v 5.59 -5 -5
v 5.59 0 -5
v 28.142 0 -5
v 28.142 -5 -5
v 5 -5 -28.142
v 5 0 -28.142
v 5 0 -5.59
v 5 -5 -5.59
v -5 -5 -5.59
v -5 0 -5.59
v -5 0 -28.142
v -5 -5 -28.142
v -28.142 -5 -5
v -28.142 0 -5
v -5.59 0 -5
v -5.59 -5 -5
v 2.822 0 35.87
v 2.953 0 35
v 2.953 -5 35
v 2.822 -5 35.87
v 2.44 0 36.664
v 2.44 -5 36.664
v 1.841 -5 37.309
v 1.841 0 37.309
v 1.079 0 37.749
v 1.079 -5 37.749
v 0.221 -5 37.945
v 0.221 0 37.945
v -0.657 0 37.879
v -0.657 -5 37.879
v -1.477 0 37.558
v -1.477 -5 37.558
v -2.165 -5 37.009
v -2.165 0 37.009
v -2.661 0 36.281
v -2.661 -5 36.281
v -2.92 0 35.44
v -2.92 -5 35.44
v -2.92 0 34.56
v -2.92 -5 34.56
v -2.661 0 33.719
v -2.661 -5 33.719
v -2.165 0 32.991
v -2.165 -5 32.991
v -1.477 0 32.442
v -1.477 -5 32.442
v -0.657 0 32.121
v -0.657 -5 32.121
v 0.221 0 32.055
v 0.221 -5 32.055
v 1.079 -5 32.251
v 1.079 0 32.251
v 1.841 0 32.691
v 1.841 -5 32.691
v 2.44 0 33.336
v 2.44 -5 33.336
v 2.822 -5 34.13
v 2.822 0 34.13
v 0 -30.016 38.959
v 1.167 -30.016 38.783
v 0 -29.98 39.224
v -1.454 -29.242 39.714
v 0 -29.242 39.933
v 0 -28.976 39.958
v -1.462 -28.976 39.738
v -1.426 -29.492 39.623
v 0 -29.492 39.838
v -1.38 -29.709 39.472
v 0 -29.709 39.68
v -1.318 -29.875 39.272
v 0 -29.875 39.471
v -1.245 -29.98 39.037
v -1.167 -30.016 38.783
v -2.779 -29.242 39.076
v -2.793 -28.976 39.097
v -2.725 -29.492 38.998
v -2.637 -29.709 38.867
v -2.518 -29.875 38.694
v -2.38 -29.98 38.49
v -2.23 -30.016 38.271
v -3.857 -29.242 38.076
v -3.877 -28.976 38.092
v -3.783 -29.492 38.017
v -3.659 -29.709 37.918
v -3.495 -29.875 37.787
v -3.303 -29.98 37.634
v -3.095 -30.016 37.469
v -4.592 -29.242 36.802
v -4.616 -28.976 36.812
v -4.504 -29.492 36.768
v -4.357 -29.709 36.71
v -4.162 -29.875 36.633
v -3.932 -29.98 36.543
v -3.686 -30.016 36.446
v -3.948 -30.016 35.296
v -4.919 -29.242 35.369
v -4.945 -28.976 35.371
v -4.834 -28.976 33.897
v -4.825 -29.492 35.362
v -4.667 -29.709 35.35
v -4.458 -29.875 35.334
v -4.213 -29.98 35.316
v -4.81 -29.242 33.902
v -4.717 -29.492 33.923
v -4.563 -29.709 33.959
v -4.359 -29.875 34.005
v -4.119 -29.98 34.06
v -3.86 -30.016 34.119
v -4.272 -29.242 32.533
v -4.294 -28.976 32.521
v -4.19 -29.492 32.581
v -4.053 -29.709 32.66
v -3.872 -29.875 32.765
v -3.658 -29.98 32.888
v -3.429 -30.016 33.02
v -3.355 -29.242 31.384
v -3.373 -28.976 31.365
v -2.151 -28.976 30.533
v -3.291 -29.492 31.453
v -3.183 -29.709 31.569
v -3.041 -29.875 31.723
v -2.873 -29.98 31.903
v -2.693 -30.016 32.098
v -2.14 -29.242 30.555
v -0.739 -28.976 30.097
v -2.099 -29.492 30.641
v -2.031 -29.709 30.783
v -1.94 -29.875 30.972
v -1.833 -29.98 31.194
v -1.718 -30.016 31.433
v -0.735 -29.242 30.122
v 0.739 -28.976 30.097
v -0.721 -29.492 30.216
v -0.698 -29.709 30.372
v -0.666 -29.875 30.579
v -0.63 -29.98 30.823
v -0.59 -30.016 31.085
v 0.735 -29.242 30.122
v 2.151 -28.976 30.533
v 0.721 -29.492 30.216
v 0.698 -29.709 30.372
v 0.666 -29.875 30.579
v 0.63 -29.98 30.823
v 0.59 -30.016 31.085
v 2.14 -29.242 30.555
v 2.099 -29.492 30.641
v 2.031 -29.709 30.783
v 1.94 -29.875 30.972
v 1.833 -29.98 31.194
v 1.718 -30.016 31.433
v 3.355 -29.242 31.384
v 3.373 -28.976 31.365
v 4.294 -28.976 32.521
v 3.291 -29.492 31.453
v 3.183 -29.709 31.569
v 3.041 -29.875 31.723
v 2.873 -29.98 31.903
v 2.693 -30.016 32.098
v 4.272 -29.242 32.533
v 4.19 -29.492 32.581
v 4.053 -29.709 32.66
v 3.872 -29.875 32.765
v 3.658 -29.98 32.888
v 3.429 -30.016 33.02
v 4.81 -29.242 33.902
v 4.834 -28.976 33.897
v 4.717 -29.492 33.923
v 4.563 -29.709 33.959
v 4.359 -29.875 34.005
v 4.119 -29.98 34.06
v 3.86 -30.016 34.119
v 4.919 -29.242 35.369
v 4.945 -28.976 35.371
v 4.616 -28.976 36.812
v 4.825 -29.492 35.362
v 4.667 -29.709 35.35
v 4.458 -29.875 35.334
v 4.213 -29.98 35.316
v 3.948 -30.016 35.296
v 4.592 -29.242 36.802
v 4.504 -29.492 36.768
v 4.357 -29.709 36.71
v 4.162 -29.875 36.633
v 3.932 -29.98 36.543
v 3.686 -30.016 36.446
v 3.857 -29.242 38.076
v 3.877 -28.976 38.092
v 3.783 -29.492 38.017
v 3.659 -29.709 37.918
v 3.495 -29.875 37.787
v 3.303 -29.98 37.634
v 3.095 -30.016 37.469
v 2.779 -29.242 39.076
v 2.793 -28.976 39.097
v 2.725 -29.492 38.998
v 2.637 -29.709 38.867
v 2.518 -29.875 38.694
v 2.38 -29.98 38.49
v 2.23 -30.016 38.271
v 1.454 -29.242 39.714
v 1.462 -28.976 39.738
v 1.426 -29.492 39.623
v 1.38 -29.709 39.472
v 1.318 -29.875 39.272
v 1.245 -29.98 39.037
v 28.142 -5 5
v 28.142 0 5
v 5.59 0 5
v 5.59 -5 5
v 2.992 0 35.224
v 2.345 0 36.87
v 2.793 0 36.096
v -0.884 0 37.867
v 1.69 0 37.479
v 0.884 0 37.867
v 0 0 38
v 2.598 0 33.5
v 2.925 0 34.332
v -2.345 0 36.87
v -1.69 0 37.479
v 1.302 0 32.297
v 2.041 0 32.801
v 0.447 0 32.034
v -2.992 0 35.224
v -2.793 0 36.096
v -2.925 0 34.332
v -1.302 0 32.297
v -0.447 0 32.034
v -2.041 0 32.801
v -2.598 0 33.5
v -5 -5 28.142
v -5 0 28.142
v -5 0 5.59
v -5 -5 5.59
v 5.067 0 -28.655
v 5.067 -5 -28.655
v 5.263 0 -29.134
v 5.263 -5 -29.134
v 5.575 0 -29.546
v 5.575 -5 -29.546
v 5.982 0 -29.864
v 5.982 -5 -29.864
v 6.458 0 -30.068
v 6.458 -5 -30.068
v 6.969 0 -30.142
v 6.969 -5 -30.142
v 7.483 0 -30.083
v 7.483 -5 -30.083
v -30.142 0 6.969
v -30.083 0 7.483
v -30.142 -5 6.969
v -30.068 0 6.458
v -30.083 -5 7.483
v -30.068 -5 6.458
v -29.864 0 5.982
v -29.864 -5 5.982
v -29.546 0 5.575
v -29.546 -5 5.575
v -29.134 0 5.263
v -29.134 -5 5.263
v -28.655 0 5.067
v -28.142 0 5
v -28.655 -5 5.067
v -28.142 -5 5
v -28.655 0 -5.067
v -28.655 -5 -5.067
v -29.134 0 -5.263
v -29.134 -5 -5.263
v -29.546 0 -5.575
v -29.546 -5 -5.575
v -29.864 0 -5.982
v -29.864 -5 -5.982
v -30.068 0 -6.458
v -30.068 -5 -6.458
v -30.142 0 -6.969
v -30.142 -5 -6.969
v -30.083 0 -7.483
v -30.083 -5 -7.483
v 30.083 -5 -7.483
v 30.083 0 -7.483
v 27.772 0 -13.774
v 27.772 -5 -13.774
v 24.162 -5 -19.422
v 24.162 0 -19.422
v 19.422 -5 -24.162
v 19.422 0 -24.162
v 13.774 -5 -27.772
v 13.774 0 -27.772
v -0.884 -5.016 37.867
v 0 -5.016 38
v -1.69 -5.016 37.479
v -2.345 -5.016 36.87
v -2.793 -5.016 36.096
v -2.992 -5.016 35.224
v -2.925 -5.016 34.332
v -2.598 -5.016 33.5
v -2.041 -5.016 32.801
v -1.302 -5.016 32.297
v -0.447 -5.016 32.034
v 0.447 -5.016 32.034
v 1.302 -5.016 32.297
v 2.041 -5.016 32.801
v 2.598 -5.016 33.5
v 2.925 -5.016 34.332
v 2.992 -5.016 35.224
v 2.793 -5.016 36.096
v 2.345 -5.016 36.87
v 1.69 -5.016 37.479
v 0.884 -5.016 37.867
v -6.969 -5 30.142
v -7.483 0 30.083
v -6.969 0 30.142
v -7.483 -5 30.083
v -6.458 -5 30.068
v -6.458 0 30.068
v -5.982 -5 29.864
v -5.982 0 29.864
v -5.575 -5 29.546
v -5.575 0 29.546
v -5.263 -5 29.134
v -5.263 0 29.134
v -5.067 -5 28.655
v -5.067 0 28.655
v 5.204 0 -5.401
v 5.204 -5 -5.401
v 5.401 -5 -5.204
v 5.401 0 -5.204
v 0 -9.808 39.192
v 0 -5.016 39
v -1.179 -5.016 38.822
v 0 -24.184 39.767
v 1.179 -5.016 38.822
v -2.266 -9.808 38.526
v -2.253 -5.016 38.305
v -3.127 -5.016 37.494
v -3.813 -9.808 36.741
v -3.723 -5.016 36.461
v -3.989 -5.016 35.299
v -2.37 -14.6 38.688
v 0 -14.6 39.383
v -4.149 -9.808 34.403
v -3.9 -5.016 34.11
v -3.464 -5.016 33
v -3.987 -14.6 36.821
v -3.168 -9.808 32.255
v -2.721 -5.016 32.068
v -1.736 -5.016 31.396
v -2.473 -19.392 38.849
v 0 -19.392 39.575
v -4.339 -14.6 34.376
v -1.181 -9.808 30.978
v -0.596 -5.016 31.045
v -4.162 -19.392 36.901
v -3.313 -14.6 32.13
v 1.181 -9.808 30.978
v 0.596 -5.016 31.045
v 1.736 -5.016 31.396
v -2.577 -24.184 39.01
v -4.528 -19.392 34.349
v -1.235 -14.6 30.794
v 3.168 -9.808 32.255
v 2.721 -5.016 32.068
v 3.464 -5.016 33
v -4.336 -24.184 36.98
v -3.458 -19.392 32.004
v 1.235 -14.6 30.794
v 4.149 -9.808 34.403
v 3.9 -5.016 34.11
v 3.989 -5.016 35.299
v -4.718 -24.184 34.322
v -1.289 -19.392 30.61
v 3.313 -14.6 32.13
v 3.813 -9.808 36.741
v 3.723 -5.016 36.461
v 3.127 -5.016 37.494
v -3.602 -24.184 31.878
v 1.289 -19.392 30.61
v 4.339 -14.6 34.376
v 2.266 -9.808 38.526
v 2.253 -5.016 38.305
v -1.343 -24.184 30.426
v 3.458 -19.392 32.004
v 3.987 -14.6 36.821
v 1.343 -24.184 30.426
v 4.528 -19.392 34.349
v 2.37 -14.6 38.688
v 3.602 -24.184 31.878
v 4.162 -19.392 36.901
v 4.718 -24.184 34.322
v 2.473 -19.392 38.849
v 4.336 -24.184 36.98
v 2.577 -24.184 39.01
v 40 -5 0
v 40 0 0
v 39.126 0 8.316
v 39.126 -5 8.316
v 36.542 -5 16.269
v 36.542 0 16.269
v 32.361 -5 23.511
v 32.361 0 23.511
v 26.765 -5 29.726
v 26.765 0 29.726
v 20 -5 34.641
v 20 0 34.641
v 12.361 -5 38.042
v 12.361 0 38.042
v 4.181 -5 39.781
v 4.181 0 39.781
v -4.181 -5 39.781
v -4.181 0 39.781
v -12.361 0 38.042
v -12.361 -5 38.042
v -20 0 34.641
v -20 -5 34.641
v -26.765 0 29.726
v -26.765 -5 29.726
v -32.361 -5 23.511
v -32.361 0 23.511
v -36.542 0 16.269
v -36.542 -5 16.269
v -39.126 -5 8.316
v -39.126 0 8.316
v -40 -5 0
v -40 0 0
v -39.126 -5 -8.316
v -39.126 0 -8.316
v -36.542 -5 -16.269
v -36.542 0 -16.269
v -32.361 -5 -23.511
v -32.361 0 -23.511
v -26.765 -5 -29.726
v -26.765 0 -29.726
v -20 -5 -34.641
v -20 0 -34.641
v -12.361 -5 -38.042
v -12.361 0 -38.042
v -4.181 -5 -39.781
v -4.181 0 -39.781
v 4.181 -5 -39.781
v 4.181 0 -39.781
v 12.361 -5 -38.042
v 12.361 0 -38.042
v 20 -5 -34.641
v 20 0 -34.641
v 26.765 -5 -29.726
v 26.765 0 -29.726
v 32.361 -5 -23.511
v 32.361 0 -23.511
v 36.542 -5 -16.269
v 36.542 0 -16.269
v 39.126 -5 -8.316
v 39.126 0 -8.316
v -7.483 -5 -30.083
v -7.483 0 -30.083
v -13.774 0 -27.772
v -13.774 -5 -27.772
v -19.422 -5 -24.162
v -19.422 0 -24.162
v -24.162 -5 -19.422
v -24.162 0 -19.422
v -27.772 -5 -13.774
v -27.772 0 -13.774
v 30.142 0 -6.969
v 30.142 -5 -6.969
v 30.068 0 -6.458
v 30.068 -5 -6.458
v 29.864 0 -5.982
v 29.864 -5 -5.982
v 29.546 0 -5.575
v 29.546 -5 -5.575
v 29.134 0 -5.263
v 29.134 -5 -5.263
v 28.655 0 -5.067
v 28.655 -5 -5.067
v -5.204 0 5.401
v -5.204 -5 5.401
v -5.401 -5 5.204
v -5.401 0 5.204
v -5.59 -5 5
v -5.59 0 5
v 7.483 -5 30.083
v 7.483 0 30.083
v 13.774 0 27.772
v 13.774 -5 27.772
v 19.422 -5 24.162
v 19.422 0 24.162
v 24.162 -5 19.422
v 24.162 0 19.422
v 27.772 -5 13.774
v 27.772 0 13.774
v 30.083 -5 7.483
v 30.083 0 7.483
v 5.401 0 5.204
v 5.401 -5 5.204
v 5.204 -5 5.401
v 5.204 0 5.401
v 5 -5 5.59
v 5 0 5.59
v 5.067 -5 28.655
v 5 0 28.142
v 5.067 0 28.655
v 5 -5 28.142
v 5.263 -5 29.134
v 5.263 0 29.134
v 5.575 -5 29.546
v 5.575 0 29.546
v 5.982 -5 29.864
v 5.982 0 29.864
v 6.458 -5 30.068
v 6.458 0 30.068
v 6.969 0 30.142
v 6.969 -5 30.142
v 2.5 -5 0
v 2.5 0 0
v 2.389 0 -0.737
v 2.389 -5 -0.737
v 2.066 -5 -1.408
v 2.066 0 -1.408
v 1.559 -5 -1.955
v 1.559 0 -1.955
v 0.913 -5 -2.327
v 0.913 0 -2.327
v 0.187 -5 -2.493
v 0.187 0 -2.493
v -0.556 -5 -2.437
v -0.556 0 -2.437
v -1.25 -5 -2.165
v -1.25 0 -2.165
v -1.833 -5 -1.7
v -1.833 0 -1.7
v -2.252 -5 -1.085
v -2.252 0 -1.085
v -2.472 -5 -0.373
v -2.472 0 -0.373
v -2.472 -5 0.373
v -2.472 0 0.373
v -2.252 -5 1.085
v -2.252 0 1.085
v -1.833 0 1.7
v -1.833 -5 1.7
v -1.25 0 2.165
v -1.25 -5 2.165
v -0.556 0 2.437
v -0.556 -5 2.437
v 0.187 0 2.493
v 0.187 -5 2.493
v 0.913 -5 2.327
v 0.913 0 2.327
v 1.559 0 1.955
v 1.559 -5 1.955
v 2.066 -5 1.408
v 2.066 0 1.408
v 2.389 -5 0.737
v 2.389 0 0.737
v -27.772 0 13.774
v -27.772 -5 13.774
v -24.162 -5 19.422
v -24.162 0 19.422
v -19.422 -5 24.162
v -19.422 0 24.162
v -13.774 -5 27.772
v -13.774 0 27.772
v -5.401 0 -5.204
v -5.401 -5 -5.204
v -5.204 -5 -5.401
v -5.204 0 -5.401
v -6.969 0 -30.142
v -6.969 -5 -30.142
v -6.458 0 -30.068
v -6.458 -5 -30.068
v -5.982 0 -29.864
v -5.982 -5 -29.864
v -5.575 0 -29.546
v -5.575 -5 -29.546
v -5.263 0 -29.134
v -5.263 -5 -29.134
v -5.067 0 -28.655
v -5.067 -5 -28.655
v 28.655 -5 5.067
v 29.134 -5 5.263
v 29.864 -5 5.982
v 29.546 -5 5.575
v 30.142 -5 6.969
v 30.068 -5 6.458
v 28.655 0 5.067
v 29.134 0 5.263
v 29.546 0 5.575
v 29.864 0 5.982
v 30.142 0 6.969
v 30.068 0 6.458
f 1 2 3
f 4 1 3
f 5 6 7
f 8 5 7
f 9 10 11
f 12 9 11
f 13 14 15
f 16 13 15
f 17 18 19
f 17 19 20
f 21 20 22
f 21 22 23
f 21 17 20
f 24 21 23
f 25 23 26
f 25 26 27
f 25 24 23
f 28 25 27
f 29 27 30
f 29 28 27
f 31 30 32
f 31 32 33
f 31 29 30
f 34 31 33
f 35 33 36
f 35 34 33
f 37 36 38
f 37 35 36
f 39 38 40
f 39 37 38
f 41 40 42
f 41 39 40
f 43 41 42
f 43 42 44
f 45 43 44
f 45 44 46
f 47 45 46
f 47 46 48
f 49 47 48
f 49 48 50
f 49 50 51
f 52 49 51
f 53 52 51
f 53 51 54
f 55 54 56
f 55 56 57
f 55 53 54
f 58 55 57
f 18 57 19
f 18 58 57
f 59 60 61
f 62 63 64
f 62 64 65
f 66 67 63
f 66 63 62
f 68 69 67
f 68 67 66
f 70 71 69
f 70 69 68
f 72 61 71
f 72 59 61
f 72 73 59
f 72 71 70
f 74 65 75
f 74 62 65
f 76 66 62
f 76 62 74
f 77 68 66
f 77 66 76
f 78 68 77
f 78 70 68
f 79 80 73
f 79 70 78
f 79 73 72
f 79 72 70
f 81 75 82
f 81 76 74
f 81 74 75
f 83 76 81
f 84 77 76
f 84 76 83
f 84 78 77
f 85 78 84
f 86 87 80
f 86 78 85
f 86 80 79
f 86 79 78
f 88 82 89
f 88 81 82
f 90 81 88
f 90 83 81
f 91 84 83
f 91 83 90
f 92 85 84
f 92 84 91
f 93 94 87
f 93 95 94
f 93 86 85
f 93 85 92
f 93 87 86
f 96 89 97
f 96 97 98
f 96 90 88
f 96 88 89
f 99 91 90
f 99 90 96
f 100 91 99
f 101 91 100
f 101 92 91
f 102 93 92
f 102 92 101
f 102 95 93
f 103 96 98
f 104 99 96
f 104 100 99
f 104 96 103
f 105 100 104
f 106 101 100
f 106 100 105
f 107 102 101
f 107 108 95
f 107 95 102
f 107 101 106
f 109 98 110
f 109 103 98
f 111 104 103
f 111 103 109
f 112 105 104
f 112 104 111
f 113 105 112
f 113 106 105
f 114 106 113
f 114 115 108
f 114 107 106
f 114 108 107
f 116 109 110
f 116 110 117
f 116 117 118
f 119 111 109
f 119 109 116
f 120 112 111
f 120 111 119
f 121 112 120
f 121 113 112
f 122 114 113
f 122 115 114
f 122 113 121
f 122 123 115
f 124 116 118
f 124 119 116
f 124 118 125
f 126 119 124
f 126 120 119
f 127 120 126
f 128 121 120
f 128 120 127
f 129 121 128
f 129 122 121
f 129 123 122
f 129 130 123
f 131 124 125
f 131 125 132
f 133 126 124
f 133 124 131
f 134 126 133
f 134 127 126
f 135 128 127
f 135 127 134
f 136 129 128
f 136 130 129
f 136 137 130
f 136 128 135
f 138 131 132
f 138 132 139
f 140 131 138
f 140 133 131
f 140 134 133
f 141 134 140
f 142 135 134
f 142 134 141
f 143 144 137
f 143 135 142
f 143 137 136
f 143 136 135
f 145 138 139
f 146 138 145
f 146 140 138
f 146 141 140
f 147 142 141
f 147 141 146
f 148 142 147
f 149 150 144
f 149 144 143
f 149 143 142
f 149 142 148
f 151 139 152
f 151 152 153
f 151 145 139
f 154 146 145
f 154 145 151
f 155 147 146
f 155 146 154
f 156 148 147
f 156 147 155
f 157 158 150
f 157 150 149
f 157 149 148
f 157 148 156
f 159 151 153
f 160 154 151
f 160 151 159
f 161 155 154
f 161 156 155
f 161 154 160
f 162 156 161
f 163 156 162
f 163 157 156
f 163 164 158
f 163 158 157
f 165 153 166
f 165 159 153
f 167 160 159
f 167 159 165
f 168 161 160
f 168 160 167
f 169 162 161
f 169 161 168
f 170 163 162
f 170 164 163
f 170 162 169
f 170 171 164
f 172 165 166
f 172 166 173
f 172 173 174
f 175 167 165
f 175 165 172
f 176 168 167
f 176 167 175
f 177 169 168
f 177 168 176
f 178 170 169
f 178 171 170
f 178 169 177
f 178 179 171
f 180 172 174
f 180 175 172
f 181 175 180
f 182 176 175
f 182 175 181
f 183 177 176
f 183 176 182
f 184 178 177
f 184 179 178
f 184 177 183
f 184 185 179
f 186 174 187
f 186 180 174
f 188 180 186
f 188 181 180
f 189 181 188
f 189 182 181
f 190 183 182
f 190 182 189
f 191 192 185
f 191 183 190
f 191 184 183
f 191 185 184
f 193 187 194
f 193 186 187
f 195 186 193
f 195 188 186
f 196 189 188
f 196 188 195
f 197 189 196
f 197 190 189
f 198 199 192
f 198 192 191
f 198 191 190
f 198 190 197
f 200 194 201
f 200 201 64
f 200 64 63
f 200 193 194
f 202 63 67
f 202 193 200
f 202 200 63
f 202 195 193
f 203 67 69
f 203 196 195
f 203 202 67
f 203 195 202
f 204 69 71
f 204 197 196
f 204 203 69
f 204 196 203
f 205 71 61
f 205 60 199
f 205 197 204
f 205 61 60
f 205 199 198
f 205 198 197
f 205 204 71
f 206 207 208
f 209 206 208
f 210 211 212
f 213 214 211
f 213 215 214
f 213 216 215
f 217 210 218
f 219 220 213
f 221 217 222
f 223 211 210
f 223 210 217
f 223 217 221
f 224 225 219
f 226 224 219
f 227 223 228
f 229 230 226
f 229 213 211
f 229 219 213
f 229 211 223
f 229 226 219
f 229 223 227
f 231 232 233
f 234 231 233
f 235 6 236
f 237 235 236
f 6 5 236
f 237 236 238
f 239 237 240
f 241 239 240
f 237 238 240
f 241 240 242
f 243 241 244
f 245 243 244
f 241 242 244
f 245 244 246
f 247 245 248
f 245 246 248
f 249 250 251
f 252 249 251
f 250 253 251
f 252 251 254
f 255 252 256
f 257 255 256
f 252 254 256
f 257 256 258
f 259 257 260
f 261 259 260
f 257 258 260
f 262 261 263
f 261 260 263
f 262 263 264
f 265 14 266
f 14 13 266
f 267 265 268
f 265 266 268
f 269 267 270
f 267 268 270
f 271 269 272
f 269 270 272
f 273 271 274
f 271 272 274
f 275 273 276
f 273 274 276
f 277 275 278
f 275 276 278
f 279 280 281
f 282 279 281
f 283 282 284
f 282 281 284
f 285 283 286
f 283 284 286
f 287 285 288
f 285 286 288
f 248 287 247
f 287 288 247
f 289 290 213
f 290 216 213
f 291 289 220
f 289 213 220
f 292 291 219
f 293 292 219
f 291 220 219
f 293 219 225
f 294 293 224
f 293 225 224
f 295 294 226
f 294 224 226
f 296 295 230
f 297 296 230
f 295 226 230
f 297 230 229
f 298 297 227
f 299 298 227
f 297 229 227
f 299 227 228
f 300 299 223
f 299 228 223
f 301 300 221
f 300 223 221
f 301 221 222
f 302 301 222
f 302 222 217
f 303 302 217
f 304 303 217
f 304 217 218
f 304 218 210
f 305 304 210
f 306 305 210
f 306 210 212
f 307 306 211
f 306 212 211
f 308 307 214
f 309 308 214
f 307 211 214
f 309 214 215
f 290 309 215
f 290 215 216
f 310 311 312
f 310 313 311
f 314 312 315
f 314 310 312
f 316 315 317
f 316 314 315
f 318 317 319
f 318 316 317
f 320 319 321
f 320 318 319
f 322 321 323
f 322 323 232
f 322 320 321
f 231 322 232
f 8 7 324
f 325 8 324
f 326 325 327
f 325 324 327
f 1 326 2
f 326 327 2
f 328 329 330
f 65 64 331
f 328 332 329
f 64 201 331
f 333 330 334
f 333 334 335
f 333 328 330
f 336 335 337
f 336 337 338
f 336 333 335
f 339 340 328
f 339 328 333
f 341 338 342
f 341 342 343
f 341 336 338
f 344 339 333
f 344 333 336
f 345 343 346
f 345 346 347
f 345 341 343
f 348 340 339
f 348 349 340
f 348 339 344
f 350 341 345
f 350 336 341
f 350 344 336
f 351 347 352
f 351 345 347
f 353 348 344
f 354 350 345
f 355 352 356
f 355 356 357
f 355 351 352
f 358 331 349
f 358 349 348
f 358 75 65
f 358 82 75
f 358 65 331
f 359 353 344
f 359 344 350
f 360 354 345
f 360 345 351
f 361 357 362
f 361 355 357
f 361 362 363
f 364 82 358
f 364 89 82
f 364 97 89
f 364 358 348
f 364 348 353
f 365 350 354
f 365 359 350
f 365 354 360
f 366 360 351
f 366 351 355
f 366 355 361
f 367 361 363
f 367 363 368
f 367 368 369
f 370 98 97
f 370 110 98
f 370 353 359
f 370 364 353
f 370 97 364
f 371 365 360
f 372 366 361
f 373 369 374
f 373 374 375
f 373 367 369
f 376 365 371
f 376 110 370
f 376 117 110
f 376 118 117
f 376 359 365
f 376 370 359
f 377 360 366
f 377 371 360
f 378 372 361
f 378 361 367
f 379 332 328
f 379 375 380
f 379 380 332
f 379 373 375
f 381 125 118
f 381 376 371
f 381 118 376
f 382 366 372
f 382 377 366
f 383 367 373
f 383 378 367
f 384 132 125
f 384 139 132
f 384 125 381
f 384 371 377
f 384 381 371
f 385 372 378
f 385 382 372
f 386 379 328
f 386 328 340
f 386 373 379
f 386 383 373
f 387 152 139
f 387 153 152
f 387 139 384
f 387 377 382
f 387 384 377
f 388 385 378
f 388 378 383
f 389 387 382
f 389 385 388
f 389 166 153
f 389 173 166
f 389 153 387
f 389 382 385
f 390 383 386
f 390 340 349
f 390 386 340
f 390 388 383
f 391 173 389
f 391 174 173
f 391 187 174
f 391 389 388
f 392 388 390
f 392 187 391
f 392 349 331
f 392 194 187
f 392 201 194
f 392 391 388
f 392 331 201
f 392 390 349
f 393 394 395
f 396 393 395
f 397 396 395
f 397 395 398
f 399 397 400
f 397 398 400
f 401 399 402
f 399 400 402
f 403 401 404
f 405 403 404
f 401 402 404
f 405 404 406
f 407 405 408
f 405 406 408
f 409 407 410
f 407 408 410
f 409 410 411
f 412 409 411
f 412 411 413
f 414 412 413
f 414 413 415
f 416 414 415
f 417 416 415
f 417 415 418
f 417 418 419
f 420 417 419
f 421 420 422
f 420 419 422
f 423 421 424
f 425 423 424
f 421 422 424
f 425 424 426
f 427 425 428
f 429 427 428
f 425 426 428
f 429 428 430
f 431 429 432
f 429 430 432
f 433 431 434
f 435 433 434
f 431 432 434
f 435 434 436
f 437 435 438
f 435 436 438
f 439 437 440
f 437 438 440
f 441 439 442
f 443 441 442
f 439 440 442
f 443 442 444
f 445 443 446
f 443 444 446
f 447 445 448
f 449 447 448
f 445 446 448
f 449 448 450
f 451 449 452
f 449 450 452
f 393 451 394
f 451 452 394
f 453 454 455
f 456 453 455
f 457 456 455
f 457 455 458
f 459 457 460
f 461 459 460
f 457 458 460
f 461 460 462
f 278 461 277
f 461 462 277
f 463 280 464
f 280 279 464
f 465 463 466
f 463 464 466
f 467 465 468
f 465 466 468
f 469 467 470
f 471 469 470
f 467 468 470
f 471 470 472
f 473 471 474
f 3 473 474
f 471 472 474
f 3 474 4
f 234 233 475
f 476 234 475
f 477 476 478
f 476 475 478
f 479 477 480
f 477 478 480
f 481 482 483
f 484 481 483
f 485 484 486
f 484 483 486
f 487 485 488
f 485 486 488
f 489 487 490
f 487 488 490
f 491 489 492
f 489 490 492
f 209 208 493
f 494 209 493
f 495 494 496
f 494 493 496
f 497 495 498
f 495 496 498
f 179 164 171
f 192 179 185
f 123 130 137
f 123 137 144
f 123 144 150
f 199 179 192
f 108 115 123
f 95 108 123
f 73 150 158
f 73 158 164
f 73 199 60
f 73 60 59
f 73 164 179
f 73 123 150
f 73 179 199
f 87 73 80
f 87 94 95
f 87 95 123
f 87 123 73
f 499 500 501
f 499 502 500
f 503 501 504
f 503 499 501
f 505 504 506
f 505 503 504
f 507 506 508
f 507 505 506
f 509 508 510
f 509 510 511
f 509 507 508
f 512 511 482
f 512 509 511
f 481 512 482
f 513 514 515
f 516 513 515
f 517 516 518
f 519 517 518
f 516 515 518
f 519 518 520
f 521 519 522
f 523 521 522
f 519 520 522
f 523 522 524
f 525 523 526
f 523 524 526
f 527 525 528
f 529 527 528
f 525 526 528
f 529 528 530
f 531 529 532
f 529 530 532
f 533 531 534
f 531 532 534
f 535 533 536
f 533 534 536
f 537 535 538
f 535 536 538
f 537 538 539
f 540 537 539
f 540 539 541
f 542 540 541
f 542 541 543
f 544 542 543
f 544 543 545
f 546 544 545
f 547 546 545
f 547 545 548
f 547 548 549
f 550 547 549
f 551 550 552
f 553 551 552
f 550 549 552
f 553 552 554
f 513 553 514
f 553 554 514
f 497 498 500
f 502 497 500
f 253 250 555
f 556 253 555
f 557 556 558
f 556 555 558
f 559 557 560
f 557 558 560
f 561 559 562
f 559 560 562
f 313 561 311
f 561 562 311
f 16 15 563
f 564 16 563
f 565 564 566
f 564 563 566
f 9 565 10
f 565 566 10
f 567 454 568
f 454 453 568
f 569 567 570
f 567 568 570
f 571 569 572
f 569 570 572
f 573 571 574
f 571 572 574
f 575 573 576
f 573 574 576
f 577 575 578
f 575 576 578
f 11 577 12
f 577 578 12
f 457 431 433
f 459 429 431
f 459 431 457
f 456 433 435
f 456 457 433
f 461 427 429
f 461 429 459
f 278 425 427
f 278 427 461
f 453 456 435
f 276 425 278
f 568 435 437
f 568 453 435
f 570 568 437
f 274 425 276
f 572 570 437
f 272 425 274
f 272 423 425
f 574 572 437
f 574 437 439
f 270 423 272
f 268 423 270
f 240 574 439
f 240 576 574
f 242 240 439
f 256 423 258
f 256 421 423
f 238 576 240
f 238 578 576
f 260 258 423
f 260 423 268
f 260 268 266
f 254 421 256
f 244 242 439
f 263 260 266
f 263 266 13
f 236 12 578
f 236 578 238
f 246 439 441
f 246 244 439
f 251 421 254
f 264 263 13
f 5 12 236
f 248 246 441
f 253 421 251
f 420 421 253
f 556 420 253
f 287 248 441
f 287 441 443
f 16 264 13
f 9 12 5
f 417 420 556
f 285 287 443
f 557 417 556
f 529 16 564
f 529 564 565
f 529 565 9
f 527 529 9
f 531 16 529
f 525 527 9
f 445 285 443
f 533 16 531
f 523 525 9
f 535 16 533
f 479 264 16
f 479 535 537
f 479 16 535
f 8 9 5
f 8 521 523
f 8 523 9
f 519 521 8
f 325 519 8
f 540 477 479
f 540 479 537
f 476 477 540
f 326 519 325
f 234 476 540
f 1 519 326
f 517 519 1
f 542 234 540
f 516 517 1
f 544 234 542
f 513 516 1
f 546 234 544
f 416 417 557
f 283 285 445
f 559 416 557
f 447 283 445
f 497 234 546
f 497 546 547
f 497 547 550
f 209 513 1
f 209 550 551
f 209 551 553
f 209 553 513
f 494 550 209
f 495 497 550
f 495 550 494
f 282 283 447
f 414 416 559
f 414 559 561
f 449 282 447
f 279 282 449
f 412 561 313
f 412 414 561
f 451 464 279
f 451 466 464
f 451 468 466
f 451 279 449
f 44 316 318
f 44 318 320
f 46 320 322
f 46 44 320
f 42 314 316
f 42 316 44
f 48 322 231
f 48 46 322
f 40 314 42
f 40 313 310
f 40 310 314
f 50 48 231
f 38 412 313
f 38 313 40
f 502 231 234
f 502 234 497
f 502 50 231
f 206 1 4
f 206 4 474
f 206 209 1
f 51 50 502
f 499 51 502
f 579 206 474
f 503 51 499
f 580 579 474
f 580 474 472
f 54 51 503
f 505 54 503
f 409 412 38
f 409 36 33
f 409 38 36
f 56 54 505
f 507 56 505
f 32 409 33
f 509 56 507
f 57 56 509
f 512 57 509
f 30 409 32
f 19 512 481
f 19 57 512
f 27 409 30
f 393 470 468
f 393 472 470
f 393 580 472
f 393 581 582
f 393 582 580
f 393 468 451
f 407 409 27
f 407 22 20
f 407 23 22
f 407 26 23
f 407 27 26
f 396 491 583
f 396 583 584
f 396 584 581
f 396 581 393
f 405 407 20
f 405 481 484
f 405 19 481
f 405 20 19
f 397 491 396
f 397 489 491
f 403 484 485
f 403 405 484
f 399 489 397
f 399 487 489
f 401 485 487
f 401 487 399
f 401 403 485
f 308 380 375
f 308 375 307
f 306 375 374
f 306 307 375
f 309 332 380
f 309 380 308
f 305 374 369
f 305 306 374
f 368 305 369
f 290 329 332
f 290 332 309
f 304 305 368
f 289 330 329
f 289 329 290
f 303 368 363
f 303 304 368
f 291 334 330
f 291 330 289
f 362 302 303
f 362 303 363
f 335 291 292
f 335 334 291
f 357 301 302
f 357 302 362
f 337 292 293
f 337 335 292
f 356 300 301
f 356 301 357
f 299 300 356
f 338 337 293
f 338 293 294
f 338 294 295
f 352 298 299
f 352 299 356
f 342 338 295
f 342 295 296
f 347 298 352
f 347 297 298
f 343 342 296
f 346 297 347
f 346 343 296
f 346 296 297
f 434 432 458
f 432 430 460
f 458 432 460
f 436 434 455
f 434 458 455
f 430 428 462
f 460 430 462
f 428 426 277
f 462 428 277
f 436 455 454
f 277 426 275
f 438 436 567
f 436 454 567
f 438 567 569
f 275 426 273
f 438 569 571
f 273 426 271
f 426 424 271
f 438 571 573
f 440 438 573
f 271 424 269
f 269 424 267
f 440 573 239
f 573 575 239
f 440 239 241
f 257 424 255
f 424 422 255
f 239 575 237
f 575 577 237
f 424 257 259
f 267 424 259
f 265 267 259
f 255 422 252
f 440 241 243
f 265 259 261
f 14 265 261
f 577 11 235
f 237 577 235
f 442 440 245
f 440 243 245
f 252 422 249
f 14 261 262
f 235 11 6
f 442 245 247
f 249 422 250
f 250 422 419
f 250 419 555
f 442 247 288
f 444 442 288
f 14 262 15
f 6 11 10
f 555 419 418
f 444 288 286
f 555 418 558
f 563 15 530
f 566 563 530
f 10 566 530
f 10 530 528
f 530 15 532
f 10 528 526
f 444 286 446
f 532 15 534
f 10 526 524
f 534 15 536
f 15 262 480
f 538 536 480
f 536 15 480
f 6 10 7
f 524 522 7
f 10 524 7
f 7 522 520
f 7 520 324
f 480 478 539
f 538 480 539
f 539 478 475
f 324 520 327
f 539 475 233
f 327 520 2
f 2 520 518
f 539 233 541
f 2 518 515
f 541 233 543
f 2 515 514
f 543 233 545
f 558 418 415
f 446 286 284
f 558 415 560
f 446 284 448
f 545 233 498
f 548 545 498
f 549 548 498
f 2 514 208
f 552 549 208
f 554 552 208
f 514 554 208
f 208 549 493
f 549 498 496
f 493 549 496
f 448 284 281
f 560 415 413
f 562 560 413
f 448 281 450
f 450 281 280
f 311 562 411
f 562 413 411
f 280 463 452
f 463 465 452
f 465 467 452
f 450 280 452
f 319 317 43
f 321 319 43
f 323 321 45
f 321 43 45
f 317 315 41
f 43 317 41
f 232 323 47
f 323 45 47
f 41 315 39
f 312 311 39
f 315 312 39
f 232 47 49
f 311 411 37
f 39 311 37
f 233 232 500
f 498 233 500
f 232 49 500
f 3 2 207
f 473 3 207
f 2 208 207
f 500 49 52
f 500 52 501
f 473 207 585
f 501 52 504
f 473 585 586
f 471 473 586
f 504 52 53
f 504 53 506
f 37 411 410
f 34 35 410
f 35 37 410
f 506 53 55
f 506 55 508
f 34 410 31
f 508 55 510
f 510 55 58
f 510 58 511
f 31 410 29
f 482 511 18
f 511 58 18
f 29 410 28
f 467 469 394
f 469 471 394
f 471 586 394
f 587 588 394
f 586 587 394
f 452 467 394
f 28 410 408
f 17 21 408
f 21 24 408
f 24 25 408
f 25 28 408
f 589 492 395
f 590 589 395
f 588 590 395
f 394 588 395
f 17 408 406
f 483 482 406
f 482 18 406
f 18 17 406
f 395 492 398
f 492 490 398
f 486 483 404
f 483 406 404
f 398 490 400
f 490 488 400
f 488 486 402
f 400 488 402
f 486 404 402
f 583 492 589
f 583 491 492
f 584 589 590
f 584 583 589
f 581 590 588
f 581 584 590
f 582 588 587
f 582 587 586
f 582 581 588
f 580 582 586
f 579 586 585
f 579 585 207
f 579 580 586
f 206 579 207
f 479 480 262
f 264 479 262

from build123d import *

# Parameters (mm, degrees)
F0_W     = 5.0157066435
F0_H     = 3
F2_R     = 1
F3_R     = 40
F3_R_2   = 2.9532327727
F4_DEPTH = 5
F5_R     = 2


with BuildPart() as f1:
    # F0 (on Right) → F1 (revolve)
    with BuildSketch(Plane.YZ):
        with Locations((-2.5078533217, 36.5)):
            Rectangle(F0_W, F0_H)
        Polygon((-5.0157066435, 39), (-30.0157066435, 40), (-30.0157066435, 35), (-5.0157066435, 35), (-5.0157066435, 38), align=None)
    revolve(axis=Axis((0, -14.3560131546, 35), (0, -1, 0)))

    # F2
    f2_edges = [f1.edges().sort_by_distance(p)[0] for p in [
        (0, -30.015707, 30),
    ]]
    fillet(f2_edges, radius=F2_R)


with BuildPart() as f4:
    # F3 (on Front) → F4 (new body)
    with BuildSketch(Plane.XZ):
        Circle(F3_R)
        with BuildLine():
            ThreePointArc((-5.5901700437, -4.9999998882), (-5.3033008589, -5.3033008589), (-4.9999998882, -5.5901700437))
            Line((-4.9999998882, -5.5901700437), (-4.9999998882, -30.5941170998))
            ThreePointArc((-4.9999998882, -30.5941170998), (-21.9203102168, -21.9203102168), (-30.5941170998, -4.9999998882))
            Line((-30.5941170998, -4.9999998882), (-5.5901700437, -4.9999998882))
        make_face(mode=Mode.SUBTRACT)
        with BuildLine():
            ThreePointArc((5, -5.5901699437), (5.3033008589, -5.3033008589), (5.5901699437, -5))
            Line((5.5901699437, -5), (30.5941170816, -5))
            ThreePointArc((30.5941170816, -5), (21.9203102168, -21.9203102168), (5, -30.5941170816))
            Line((5, -30.5941170816), (5, -5.5901699437))
        make_face(mode=Mode.SUBTRACT)
        with BuildLine():
            Line((-5, 30.5941170816), (-5, 5.5901699437))
            ThreePointArc((-5, 5.5901699437), (-5.3033008589, 5.3033008589), (-5.5901699437, 5))
            Line((-5.5901699437, 5), (-30.5941170816, 5))
            ThreePointArc((-30.5941170816, 5), (-21.9203102168, 21.9203102168), (-5, 30.5941170816))
        make_face(mode=Mode.SUBTRACT)
        with BuildLine():
            ThreePointArc((-2.5, 0), (0, 2.5), (2.5, 0))
            ThreePointArc((2.5, 0), (0, -2.5), (-2.5, 0))
        make_face(mode=Mode.SUBTRACT)
        with BuildLine():
            ThreePointArc((5, 30.5941170816), (21.9203102168, 21.9203102168), (30.5941170816, 5))
            Line((30.5941170816, 5), (5.5901699437, 5))
            ThreePointArc((5.5901699437, 5), (5.3033008589, 5.3033008589), (5, 5.5901699437))
            Line((5, 5.5901699437), (5, 30.5941170816))
        make_face(mode=Mode.SUBTRACT)
        with Locations((0, 35)):
            Circle(F3_R_2, mode=Mode.SUBTRACT)
    extrude(amount=F4_DEPTH)

    # F5
    f5_edges = [f4.edges().sort_by_distance(p)[0] for p in [
        (5, -2.5, 30.594117),
        (-5, -2.5, 30.594117),
        (-30.594117, -2.5, 5),
        (-30.594117, -2.5, -5),
        (-5, -2.5, -30.594117),
        (5, -2.5, -30.594117),
        (30.594117, -2.5, -5),
        (30.594117, -2.5, 5),
    ]]
    fillet(f5_edges, radius=F5_R)


solid = Compound([f1.part, f4.part])
